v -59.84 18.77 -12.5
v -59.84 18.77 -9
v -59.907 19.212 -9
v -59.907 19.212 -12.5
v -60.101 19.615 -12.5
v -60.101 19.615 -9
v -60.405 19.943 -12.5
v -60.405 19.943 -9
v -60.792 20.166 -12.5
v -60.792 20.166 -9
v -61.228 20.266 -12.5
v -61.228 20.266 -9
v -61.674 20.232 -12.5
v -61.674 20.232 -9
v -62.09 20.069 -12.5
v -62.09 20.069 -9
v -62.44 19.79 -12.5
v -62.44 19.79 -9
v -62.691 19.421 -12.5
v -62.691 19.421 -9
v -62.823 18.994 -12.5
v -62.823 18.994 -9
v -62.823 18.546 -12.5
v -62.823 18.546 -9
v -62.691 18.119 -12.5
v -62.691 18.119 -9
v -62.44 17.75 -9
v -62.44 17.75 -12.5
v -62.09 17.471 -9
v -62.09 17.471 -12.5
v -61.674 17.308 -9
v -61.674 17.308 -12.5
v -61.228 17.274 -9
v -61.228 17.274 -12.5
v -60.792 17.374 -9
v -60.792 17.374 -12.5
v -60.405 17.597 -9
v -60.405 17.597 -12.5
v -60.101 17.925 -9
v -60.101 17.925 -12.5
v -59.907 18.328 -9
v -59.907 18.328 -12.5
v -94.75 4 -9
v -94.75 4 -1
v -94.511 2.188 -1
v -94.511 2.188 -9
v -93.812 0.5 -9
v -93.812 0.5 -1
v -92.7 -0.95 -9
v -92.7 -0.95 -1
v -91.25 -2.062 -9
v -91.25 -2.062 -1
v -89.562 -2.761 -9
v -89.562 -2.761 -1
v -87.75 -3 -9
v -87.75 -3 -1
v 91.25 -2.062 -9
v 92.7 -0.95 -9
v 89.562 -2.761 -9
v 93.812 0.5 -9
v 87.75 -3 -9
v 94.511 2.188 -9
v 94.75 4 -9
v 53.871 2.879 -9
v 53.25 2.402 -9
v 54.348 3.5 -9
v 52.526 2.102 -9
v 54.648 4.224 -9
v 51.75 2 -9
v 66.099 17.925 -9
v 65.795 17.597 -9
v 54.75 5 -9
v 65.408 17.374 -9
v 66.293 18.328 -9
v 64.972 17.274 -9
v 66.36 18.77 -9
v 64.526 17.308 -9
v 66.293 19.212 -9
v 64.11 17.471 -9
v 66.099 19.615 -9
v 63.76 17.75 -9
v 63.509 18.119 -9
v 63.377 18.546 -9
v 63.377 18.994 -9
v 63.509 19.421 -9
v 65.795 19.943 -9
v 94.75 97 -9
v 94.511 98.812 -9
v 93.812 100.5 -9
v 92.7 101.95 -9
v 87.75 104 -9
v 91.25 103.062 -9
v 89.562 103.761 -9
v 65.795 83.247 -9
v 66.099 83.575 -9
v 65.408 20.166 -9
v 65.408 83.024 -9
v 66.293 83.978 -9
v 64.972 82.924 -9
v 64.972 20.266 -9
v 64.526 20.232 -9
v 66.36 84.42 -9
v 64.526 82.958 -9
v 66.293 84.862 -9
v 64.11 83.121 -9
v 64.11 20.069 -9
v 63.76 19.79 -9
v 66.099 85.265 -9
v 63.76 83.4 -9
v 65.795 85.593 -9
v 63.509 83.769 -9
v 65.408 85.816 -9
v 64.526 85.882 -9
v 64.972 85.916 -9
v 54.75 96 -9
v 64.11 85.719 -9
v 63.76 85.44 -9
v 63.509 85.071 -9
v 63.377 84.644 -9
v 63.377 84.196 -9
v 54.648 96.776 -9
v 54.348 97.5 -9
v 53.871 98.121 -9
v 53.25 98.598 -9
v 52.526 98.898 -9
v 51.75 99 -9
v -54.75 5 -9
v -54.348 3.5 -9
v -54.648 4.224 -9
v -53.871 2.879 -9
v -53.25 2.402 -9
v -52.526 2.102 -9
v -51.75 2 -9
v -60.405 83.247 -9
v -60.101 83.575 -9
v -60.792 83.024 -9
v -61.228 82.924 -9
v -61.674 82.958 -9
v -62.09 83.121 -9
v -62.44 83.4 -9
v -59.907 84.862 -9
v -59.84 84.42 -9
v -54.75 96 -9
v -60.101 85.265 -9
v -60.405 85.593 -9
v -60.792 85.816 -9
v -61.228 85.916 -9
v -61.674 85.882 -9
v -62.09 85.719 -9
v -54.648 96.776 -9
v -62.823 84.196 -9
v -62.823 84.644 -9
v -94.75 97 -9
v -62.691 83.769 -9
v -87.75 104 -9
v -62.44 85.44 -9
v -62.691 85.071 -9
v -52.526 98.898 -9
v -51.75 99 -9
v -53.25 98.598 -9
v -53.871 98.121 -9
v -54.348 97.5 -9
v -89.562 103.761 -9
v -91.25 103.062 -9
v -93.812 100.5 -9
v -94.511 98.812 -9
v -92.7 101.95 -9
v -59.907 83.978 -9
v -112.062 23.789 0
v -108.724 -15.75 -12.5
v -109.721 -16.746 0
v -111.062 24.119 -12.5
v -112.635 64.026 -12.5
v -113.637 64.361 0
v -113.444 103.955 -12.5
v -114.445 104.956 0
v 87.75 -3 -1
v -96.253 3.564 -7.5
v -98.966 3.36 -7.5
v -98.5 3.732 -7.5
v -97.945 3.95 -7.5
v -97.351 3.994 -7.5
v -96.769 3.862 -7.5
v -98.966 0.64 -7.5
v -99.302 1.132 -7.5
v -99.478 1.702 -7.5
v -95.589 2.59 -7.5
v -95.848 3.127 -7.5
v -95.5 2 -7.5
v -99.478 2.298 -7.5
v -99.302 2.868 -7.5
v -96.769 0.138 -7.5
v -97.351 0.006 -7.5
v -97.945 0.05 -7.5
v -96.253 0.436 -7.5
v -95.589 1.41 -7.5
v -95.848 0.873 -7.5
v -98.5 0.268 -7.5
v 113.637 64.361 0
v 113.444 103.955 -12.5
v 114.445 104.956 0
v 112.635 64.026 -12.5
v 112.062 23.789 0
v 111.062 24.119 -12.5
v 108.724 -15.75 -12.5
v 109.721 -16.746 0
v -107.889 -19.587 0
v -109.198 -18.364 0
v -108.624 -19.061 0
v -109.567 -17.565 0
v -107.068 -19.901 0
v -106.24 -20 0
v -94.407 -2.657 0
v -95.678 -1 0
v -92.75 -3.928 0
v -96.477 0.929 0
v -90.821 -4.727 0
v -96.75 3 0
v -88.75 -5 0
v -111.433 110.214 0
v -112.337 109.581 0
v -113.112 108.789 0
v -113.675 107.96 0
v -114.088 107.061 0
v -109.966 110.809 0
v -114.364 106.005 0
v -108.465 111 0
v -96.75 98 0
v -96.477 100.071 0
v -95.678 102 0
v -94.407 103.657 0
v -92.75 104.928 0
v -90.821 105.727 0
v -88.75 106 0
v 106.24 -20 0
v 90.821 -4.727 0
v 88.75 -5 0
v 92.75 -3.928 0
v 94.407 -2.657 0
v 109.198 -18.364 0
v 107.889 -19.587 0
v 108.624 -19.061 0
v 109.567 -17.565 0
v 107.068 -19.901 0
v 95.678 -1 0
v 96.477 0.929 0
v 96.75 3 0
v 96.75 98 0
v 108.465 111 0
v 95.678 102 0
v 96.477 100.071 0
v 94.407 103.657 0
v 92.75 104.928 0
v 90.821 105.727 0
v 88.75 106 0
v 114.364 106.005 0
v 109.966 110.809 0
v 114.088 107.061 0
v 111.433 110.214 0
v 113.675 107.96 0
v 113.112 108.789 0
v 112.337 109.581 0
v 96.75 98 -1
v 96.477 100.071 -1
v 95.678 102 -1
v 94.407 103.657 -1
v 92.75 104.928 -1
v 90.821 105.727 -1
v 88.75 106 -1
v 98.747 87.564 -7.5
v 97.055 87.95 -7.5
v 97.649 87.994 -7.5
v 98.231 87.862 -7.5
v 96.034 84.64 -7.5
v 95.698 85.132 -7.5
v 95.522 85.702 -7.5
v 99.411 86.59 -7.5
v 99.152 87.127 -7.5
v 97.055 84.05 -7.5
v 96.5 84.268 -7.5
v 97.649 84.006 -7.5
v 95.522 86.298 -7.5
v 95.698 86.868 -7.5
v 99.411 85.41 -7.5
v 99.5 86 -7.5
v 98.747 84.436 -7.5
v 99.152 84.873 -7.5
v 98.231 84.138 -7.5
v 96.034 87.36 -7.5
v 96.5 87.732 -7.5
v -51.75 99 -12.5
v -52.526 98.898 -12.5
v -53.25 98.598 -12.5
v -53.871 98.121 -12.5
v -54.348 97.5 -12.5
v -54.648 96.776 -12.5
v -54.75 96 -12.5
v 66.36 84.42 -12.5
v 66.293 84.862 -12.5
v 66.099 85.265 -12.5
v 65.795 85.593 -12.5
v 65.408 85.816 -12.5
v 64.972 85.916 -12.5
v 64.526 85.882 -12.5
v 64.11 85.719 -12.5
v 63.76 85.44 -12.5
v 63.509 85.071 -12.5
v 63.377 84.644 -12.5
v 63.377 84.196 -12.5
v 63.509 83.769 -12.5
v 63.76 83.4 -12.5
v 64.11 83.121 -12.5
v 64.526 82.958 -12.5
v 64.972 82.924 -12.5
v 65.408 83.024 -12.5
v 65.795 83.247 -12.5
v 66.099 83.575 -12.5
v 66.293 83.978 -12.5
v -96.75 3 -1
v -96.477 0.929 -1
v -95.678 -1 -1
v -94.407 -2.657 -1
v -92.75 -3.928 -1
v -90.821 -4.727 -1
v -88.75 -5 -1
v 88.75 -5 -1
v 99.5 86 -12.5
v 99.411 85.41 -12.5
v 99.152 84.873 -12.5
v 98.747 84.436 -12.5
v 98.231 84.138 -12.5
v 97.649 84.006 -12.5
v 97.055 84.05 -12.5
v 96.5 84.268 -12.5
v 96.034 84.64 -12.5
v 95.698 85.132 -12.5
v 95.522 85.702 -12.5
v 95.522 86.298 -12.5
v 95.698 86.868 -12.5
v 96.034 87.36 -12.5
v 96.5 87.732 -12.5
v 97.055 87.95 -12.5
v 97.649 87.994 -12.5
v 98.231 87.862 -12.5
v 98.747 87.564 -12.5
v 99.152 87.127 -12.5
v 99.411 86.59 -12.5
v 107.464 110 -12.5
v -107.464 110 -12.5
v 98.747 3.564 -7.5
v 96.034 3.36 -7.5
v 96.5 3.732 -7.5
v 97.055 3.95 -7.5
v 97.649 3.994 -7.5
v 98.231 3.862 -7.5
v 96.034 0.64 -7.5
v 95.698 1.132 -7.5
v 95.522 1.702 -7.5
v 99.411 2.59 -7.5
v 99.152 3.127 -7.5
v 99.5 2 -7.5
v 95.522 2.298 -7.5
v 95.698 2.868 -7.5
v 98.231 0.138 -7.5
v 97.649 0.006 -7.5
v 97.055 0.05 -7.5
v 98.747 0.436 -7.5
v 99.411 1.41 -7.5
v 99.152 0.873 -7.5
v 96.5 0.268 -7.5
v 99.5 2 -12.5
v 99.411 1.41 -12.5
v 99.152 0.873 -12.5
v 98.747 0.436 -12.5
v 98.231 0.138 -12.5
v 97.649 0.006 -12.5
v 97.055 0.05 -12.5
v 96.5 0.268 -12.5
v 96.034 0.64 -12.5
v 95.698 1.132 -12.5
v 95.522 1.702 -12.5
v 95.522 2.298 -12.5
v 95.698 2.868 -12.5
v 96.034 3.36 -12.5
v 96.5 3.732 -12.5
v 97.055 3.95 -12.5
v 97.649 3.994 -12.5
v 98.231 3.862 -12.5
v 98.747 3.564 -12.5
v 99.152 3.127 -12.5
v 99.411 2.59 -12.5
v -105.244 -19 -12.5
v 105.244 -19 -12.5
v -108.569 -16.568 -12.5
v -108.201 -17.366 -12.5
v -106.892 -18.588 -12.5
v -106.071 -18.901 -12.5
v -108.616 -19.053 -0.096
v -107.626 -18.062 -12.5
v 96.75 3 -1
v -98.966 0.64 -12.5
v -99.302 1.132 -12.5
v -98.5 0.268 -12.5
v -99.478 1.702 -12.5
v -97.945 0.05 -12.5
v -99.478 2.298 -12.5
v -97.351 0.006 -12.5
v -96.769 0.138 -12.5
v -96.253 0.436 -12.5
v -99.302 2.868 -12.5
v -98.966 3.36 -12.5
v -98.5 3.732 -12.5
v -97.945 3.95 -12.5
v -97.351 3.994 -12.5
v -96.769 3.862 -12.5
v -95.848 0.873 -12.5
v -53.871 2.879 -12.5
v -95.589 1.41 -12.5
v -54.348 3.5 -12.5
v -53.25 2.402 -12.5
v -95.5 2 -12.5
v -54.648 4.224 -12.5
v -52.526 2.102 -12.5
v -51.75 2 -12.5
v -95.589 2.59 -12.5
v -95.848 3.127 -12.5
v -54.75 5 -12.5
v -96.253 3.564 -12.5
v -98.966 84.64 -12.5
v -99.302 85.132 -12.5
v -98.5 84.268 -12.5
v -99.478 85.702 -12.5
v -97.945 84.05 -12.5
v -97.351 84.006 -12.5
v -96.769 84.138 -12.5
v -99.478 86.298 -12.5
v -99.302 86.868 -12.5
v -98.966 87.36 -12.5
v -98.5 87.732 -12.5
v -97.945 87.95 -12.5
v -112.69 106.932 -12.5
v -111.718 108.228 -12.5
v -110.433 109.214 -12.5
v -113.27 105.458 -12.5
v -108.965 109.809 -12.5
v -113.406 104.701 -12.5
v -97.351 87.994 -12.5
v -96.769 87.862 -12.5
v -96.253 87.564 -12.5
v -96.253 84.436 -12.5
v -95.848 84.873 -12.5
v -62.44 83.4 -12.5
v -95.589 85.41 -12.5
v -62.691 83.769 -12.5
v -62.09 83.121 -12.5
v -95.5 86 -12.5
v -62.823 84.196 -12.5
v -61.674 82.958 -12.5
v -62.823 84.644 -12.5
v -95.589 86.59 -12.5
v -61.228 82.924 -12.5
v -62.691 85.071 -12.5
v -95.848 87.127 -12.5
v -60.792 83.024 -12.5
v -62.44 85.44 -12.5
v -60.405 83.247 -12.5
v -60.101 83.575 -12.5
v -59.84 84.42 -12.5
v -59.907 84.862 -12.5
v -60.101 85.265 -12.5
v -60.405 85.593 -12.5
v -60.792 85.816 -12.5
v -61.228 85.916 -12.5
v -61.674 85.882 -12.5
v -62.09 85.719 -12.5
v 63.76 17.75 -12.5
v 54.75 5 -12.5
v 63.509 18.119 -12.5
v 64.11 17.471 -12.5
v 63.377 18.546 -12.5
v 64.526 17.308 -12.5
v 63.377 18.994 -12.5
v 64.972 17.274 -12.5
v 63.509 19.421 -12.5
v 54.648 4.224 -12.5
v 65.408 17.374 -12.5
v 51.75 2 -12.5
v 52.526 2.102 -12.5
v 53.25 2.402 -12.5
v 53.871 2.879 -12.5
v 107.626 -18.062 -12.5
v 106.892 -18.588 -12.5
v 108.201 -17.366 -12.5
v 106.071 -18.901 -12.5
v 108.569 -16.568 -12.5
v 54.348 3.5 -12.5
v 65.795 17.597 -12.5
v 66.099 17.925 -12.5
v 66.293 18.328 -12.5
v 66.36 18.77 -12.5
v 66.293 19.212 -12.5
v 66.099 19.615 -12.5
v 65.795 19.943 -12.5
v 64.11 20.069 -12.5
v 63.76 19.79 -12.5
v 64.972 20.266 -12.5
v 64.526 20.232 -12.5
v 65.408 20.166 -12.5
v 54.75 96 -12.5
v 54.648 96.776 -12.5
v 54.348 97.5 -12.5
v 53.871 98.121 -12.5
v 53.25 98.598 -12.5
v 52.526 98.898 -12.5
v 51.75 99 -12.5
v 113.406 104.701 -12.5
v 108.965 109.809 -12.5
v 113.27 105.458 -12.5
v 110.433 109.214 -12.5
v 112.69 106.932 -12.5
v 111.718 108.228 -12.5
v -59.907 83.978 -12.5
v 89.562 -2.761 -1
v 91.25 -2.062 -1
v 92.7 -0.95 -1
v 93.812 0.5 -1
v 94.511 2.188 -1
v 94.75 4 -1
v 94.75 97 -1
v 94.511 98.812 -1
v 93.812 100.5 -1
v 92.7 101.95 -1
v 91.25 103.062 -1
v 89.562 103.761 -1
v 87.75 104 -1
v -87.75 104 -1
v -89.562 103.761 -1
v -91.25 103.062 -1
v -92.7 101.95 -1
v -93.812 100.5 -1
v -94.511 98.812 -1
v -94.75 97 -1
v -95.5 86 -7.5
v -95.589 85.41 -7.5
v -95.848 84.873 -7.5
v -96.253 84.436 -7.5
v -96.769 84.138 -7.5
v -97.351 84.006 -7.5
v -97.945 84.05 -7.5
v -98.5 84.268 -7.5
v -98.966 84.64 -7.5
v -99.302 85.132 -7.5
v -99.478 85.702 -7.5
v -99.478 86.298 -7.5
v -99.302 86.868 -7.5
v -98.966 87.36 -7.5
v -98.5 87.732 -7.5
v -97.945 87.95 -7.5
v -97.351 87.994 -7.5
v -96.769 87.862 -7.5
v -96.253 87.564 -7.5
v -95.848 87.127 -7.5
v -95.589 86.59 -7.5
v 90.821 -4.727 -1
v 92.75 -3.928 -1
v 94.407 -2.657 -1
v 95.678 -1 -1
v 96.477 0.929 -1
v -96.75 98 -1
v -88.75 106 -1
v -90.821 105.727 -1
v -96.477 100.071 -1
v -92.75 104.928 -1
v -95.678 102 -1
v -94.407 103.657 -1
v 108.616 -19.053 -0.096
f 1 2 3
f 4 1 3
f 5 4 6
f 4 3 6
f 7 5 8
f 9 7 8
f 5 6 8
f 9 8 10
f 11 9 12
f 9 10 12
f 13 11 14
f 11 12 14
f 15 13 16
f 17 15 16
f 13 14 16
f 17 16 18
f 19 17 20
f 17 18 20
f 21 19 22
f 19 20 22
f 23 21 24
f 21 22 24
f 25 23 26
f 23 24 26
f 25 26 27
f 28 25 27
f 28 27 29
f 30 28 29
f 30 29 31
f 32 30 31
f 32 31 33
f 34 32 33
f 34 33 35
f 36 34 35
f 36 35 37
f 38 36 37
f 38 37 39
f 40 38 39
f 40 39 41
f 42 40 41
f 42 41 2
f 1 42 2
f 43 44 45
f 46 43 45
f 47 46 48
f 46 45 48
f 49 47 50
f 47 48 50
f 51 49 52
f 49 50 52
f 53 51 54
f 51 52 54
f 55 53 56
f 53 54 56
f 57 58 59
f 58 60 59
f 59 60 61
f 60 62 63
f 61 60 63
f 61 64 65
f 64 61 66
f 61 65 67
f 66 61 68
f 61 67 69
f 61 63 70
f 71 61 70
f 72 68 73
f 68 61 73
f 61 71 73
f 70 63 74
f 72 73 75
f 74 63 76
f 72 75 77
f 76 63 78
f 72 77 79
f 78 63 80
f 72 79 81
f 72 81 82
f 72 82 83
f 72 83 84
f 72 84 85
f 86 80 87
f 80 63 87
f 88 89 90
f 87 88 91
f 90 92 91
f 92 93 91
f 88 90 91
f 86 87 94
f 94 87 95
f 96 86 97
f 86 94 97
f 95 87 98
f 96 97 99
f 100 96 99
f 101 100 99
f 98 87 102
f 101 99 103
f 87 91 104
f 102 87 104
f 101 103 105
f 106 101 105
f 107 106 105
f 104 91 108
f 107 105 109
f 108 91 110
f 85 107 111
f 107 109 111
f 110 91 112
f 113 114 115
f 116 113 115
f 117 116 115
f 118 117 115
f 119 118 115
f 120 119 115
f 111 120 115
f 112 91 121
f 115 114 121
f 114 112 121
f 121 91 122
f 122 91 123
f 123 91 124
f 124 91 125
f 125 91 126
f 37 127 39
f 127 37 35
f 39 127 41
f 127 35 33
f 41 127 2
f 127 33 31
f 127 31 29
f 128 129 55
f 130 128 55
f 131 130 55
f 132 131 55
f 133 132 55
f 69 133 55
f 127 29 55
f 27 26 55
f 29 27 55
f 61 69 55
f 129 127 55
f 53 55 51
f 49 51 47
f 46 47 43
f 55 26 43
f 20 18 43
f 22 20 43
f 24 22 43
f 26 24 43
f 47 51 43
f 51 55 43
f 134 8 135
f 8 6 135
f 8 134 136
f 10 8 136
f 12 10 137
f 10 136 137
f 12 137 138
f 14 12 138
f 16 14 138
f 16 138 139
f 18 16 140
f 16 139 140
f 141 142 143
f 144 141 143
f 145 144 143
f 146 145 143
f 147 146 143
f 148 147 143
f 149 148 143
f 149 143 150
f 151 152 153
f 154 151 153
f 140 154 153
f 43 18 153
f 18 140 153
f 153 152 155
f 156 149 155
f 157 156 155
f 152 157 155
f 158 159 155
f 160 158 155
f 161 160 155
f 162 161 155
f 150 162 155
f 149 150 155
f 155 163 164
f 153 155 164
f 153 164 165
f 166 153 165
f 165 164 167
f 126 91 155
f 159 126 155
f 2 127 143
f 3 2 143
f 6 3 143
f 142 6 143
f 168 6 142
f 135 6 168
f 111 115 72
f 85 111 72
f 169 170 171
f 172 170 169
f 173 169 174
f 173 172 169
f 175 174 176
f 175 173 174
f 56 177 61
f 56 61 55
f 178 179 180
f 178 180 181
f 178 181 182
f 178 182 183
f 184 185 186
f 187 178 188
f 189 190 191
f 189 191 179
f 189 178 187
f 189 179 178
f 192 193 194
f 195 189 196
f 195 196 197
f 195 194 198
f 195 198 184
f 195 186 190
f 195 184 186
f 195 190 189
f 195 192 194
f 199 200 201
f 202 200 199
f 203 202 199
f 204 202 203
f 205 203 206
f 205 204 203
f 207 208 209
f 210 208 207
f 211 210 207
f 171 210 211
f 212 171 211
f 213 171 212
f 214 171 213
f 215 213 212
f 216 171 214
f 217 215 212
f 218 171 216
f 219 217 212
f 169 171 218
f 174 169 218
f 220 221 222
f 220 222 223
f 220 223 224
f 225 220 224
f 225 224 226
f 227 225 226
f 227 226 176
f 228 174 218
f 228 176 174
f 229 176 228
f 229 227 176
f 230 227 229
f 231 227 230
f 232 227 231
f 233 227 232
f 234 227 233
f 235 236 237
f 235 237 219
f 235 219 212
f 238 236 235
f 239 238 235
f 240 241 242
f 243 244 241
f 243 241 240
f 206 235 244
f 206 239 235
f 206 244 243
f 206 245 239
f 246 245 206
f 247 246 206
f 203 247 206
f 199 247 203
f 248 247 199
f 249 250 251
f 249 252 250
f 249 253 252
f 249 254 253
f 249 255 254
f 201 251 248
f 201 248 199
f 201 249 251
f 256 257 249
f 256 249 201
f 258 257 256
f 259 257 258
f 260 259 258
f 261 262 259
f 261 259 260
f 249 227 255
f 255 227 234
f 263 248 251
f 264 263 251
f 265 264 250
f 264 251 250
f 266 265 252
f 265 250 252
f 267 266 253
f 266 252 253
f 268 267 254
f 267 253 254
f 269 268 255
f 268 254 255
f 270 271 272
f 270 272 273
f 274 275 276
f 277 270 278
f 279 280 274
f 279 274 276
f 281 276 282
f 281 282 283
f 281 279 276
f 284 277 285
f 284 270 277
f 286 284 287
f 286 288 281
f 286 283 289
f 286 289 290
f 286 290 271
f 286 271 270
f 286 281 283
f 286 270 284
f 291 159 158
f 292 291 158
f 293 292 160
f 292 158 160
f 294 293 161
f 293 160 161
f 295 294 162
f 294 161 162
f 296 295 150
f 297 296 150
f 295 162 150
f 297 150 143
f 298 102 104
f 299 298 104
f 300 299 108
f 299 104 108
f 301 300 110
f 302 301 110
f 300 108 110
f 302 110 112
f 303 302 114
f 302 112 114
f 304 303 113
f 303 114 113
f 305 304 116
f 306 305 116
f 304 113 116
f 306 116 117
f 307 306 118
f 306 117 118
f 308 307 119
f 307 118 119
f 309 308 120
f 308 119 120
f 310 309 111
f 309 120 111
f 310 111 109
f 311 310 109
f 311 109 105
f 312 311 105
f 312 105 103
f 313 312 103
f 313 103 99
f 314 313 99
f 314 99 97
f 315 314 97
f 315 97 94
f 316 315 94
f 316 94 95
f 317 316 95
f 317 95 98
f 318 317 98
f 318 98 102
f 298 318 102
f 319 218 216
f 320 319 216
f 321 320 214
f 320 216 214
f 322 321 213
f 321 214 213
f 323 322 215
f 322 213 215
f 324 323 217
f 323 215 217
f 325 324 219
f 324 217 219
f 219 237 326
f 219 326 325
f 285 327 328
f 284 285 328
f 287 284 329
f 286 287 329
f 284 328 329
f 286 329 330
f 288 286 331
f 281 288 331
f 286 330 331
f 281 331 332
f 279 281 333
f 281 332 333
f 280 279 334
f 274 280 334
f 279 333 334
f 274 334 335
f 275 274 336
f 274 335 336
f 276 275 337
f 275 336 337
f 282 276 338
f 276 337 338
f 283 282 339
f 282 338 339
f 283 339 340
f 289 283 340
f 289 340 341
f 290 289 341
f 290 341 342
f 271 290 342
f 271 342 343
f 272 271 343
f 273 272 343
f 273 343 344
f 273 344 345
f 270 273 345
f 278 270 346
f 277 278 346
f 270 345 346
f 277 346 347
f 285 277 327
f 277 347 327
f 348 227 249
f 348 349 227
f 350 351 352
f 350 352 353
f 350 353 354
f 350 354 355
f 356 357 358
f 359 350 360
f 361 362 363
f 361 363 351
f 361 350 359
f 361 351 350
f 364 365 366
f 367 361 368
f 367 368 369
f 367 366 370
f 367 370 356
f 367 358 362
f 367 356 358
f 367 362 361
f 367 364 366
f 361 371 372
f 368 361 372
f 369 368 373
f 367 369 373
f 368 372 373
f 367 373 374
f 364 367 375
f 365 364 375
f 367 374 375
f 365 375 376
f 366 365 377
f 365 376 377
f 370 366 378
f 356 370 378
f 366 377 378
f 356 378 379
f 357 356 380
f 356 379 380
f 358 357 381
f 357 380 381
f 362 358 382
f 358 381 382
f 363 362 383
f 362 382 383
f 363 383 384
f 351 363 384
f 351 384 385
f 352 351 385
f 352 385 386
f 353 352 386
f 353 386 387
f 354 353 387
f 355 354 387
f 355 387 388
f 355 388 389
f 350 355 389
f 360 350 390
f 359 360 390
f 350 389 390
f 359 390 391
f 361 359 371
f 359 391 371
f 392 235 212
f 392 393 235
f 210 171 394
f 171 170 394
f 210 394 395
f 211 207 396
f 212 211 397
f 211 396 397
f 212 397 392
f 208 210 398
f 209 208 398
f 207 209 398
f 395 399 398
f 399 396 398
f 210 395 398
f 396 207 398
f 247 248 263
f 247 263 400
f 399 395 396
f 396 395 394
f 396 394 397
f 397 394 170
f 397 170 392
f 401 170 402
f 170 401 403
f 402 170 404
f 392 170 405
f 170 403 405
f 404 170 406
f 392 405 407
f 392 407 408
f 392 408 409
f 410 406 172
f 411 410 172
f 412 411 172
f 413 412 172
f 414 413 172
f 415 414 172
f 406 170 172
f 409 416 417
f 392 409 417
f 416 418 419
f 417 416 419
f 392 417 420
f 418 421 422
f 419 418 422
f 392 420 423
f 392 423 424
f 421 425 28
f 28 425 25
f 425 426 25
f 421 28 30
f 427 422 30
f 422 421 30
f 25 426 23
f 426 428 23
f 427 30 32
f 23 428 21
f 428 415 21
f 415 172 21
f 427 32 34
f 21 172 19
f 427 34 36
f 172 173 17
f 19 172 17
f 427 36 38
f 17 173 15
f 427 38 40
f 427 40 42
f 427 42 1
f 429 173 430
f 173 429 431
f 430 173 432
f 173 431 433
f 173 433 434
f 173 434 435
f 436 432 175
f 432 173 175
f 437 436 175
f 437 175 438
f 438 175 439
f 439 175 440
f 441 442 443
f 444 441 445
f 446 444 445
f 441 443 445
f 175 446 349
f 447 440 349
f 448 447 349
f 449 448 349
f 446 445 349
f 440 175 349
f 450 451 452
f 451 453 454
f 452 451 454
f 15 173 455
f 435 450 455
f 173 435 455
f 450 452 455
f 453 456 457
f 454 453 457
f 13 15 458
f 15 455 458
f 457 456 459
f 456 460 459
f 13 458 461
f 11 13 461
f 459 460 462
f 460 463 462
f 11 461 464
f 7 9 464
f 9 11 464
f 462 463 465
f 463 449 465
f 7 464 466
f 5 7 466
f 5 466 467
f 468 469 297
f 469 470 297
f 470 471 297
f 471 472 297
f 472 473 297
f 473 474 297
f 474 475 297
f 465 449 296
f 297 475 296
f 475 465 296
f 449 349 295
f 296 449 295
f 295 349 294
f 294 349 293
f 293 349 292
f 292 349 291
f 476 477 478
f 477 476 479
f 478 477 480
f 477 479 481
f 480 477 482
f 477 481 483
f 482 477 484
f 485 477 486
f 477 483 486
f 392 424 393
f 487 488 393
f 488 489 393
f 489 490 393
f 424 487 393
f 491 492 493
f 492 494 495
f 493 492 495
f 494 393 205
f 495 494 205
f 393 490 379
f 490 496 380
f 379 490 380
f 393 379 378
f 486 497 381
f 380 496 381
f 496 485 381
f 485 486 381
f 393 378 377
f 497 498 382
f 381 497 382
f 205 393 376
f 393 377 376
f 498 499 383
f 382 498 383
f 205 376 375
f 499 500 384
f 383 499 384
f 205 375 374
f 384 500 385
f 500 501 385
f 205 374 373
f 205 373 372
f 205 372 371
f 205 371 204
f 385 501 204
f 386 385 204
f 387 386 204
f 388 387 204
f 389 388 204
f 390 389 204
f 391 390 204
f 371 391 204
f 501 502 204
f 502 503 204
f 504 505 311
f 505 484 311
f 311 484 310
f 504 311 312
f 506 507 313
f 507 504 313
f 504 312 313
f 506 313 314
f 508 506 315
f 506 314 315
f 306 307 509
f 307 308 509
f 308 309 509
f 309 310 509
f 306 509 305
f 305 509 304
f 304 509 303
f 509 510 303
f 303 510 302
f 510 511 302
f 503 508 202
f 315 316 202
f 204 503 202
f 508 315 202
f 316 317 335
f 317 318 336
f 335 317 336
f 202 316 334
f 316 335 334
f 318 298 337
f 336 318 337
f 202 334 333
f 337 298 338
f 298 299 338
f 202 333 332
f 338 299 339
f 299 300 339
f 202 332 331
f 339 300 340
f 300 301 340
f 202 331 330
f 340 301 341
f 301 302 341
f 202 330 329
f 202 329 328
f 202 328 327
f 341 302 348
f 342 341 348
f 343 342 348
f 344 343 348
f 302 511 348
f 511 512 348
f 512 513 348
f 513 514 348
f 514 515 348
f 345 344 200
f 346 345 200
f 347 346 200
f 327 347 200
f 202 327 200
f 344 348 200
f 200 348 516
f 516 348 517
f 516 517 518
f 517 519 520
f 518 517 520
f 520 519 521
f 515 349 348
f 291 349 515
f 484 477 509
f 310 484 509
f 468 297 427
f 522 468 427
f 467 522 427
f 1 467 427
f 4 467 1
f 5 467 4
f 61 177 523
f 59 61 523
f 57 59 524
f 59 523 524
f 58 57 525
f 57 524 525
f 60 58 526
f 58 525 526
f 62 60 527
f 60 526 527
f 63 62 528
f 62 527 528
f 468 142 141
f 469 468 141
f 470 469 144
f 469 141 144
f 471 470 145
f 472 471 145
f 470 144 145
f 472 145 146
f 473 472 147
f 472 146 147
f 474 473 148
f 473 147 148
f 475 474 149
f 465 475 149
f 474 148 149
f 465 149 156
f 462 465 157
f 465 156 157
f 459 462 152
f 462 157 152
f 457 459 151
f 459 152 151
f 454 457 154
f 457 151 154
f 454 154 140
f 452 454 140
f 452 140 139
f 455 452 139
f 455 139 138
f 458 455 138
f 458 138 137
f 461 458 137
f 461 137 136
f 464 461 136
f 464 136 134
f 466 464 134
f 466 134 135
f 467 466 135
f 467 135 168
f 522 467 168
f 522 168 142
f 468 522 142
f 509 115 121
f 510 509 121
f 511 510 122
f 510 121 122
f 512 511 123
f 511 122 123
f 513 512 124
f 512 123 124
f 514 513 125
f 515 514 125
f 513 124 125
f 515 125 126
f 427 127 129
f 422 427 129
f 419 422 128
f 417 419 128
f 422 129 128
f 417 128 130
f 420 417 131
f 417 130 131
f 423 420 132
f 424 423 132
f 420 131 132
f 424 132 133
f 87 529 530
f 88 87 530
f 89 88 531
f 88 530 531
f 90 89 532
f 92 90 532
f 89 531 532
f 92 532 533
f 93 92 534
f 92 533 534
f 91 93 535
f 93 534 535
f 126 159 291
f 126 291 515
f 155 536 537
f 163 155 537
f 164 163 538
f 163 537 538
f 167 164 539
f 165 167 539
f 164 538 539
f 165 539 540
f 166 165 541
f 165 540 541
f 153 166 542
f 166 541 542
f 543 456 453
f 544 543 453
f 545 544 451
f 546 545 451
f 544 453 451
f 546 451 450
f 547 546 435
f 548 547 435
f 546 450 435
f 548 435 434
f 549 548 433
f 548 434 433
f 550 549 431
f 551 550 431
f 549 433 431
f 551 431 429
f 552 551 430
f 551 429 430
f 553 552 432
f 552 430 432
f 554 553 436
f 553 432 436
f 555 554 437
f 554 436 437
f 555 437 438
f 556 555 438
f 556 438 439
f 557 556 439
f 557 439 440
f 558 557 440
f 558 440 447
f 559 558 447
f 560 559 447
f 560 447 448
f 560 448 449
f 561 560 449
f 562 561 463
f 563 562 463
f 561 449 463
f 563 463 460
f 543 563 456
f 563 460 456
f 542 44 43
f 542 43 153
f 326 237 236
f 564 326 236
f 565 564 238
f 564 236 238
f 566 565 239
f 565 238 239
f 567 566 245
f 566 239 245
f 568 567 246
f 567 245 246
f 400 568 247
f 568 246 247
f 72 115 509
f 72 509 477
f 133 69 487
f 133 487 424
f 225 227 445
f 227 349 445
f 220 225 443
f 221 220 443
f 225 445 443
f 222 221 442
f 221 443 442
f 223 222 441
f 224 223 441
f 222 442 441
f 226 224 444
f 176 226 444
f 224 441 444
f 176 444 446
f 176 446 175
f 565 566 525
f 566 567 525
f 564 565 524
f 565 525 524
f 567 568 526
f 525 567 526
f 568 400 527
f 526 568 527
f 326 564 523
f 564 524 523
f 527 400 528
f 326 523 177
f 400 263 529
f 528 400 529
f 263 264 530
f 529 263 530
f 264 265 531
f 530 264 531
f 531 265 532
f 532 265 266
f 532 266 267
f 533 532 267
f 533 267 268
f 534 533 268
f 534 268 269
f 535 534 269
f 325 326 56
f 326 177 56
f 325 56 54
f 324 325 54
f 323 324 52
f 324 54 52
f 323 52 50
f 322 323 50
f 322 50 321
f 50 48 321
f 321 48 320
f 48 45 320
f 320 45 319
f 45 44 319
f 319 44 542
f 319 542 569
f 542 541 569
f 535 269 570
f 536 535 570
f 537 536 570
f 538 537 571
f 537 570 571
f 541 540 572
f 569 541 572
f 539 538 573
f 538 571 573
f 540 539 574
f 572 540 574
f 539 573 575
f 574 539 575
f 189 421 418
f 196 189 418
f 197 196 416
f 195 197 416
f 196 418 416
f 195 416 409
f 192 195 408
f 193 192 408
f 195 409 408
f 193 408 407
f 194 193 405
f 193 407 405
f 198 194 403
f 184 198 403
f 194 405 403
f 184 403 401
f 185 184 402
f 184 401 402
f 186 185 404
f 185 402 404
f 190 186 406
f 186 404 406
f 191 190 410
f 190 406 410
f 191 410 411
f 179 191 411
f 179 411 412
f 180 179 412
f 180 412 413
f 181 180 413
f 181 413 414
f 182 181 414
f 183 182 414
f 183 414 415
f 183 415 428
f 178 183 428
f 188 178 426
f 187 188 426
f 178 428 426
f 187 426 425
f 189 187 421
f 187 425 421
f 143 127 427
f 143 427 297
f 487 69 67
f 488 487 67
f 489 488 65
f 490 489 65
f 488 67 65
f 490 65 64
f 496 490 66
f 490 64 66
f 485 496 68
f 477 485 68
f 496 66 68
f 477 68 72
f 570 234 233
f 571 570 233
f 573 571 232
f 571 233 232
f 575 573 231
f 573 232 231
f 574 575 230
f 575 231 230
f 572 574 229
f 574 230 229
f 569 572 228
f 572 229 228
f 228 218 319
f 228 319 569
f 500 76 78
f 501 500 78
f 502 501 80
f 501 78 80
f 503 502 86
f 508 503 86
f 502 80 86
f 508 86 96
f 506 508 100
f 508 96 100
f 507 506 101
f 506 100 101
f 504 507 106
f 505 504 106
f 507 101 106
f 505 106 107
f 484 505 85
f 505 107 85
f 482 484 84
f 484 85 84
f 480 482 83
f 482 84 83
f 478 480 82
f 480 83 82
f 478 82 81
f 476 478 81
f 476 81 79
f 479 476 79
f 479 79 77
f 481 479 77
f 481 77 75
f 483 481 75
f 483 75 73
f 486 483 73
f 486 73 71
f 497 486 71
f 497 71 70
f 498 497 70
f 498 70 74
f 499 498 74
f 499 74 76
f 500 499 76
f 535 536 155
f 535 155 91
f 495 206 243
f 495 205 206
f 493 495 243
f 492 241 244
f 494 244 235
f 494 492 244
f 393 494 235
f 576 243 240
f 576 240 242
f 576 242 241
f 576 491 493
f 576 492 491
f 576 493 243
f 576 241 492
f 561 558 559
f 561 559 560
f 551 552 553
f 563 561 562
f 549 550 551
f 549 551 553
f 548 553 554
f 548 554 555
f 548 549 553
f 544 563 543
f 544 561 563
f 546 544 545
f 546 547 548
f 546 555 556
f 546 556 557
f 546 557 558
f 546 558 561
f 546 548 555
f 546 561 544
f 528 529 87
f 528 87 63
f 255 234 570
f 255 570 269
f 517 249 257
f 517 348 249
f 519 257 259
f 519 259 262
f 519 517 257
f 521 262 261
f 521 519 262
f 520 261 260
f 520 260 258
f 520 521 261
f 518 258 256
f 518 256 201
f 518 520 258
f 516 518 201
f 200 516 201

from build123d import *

# Parameters (mm, degrees)
FILLET_R        = 6
FILLET001_R     = 3.5
POCKET_DEPTH    = 1
POCKET001_DEPTH = 8
SKETCH004_R     = 1.5
POCKET002_DEPTH = 5
POCKET003_DEPTH = 5
SKETCH006_R     = 2
POCKET004_DEPTH = 5


with BuildPart() as part:
    # Sketch → AdditiveLoft section 0
    with BuildSketch(Plane.XY):
        with BuildLine():
            Line((-114.5, 111), (114.5, 111))
            ThreePointArc((109.5, -20), (112.998546, 45.461888), (114.5, 111))
            Line((109.5, -20), (-109.5, -20))
            ThreePointArc((-114.5, 111), (-112.998546, 45.461888), (-109.5, -20))
        make_face()
    # Sketch001 → AdditiveLoft section 1
    with BuildSketch(Plane.XY.offset(-12.5)):
        with BuildLine():
            Line((-113.5, 110), (113.5, 110))
            ThreePointArc((108.5, -19), (111.9985, 45.461298), (113.5, 110))
            Line((108.5, -19), (-108.5, -19))
            ThreePointArc((-113.5, 110), (-111.9985, 45.461298), (-108.5, -19))
        make_face()
    loft()

    # Fillet
    fillet_edges = [part.edges().sort_by_distance(p)[0] for p in [
        (-114, 110.5, -6.25),
        (114, 110.5, -6.25),
    ]]
    fillet(fillet_edges, radius=FILLET_R)

    # Fillet001
    fillet001_edges = [part.edges().sort_by_distance(p)[0] for p in [
        (-109, -19.5, -6.25),
        (109, -19.5, -6.25),
    ]]
    fillet(fillet001_edges, radius=FILLET001_R)

    # Sketch002 (on Face1 of Fillet001) → Pocket (cut)
    with BuildSketch(Plane.XY):
        with BuildLine():
            Line((-88.75, 106), (88.75, 106))
            ThreePointArc((96.75, 98), (94.406854, 103.656854), (88.75, 106))
            Line((96.75, 98), (96.75, 3))
            ThreePointArc((88.75, -5), (94.406854, -2.656854), (96.75, 3))
            Line((88.75, -5), (-88.75, -5))
            ThreePointArc((-96.75, 3), (-94.406854, -2.656854), (-88.75, -5))
            Line((-96.75, 3), (-96.75, 98))
            ThreePointArc((-88.75, 106), (-94.406854, 103.656854), (-96.75, 98))
        make_face()
    extrude(amount=-POCKET_DEPTH, mode=Mode.SUBTRACT)

    # Sketch003 (on Face19 of Pocket) → Pocket001 (cut)
    with BuildSketch(Plane.XY.offset(-1)):
        with BuildLine():
            Line((-87.75, 104), (87.75, 104))
            ThreePointArc((94.75, 97), (92.699747, 101.949747), (87.75, 104))
            Line((94.75, 97), (94.75, 4))
            ThreePointArc((87.75, -3), (92.699747, -0.949747), (94.75, 4))
            Line((87.75, -3), (-87.75, -3))
            ThreePointArc((-94.75, 4), (-92.699747, -0.949747), (-87.75, -3))
            Line((-94.75, 4), (-94.75, 97))
            ThreePointArc((-87.75, 104), (-92.699747, 101.949747), (-94.75, 97))
        make_face()
    extrude(amount=-POCKET001_DEPTH, mode=Mode.SUBTRACT)

    # Sketch004 (on Face28 of Pocket001) → Pocket002 (cut)
    with BuildSketch(Plane.XY.offset(-9)):
        with Locations((-61.34, 84.42)):
            Circle(SKETCH004_R)
        with Locations((64.86, 84.42)):
            Circle(SKETCH004_R)
        with Locations((64.86, 18.77)):
            Circle(SKETCH004_R)
        with Locations((-61.34, 18.77)):
            Circle(SKETCH004_R)
    extrude(amount=-POCKET002_DEPTH, mode=Mode.SUBTRACT)

    # Sketch005 (on Face32 of Pocket002) → Pocket003 (cut)
    with BuildSketch(Plane.XY.offset(-9)):
        with BuildLine():
            Line((-51.75, 99), (51.75, 99))
            ThreePointArc((54.75, 96), (53.87132, 98.12132), (51.75, 99))
            Line((54.75, 96), (54.75, 5))
            ThreePointArc((51.75, 2), (53.87132, 2.87868), (54.75, 5))
            Line((51.75, 2), (-51.75, 2))
            ThreePointArc((-54.75, 5), (-53.87132, 2.87868), (-51.75, 2))
            Line((-54.75, 5), (-54.75, 96))
            ThreePointArc((-51.75, 99), (-53.87132, 98.12132), (-54.75, 96))
        make_face()
    extrude(amount=-POCKET003_DEPTH, mode=Mode.SUBTRACT)

    # Sketch006 (on Face18 of Pocket003) → Pocket004 (cut)
    with BuildSketch(Plane(origin=(0, 0, -12.5), x_dir=(1, 0, 0), z_dir=(0, 0, -1))):
        with Locations((97.5, -86)):
            Circle(SKETCH006_R)
        with Locations((97.5, -2)):
            Circle(SKETCH006_R)
        with Locations((-97.5, -2)):
            Circle(SKETCH006_R)
        with Locations((-97.5, -86)):
            Circle(SKETCH006_R)
    extrude(amount=-POCKET004_DEPTH, mode=Mode.SUBTRACT)


solid = part.part
